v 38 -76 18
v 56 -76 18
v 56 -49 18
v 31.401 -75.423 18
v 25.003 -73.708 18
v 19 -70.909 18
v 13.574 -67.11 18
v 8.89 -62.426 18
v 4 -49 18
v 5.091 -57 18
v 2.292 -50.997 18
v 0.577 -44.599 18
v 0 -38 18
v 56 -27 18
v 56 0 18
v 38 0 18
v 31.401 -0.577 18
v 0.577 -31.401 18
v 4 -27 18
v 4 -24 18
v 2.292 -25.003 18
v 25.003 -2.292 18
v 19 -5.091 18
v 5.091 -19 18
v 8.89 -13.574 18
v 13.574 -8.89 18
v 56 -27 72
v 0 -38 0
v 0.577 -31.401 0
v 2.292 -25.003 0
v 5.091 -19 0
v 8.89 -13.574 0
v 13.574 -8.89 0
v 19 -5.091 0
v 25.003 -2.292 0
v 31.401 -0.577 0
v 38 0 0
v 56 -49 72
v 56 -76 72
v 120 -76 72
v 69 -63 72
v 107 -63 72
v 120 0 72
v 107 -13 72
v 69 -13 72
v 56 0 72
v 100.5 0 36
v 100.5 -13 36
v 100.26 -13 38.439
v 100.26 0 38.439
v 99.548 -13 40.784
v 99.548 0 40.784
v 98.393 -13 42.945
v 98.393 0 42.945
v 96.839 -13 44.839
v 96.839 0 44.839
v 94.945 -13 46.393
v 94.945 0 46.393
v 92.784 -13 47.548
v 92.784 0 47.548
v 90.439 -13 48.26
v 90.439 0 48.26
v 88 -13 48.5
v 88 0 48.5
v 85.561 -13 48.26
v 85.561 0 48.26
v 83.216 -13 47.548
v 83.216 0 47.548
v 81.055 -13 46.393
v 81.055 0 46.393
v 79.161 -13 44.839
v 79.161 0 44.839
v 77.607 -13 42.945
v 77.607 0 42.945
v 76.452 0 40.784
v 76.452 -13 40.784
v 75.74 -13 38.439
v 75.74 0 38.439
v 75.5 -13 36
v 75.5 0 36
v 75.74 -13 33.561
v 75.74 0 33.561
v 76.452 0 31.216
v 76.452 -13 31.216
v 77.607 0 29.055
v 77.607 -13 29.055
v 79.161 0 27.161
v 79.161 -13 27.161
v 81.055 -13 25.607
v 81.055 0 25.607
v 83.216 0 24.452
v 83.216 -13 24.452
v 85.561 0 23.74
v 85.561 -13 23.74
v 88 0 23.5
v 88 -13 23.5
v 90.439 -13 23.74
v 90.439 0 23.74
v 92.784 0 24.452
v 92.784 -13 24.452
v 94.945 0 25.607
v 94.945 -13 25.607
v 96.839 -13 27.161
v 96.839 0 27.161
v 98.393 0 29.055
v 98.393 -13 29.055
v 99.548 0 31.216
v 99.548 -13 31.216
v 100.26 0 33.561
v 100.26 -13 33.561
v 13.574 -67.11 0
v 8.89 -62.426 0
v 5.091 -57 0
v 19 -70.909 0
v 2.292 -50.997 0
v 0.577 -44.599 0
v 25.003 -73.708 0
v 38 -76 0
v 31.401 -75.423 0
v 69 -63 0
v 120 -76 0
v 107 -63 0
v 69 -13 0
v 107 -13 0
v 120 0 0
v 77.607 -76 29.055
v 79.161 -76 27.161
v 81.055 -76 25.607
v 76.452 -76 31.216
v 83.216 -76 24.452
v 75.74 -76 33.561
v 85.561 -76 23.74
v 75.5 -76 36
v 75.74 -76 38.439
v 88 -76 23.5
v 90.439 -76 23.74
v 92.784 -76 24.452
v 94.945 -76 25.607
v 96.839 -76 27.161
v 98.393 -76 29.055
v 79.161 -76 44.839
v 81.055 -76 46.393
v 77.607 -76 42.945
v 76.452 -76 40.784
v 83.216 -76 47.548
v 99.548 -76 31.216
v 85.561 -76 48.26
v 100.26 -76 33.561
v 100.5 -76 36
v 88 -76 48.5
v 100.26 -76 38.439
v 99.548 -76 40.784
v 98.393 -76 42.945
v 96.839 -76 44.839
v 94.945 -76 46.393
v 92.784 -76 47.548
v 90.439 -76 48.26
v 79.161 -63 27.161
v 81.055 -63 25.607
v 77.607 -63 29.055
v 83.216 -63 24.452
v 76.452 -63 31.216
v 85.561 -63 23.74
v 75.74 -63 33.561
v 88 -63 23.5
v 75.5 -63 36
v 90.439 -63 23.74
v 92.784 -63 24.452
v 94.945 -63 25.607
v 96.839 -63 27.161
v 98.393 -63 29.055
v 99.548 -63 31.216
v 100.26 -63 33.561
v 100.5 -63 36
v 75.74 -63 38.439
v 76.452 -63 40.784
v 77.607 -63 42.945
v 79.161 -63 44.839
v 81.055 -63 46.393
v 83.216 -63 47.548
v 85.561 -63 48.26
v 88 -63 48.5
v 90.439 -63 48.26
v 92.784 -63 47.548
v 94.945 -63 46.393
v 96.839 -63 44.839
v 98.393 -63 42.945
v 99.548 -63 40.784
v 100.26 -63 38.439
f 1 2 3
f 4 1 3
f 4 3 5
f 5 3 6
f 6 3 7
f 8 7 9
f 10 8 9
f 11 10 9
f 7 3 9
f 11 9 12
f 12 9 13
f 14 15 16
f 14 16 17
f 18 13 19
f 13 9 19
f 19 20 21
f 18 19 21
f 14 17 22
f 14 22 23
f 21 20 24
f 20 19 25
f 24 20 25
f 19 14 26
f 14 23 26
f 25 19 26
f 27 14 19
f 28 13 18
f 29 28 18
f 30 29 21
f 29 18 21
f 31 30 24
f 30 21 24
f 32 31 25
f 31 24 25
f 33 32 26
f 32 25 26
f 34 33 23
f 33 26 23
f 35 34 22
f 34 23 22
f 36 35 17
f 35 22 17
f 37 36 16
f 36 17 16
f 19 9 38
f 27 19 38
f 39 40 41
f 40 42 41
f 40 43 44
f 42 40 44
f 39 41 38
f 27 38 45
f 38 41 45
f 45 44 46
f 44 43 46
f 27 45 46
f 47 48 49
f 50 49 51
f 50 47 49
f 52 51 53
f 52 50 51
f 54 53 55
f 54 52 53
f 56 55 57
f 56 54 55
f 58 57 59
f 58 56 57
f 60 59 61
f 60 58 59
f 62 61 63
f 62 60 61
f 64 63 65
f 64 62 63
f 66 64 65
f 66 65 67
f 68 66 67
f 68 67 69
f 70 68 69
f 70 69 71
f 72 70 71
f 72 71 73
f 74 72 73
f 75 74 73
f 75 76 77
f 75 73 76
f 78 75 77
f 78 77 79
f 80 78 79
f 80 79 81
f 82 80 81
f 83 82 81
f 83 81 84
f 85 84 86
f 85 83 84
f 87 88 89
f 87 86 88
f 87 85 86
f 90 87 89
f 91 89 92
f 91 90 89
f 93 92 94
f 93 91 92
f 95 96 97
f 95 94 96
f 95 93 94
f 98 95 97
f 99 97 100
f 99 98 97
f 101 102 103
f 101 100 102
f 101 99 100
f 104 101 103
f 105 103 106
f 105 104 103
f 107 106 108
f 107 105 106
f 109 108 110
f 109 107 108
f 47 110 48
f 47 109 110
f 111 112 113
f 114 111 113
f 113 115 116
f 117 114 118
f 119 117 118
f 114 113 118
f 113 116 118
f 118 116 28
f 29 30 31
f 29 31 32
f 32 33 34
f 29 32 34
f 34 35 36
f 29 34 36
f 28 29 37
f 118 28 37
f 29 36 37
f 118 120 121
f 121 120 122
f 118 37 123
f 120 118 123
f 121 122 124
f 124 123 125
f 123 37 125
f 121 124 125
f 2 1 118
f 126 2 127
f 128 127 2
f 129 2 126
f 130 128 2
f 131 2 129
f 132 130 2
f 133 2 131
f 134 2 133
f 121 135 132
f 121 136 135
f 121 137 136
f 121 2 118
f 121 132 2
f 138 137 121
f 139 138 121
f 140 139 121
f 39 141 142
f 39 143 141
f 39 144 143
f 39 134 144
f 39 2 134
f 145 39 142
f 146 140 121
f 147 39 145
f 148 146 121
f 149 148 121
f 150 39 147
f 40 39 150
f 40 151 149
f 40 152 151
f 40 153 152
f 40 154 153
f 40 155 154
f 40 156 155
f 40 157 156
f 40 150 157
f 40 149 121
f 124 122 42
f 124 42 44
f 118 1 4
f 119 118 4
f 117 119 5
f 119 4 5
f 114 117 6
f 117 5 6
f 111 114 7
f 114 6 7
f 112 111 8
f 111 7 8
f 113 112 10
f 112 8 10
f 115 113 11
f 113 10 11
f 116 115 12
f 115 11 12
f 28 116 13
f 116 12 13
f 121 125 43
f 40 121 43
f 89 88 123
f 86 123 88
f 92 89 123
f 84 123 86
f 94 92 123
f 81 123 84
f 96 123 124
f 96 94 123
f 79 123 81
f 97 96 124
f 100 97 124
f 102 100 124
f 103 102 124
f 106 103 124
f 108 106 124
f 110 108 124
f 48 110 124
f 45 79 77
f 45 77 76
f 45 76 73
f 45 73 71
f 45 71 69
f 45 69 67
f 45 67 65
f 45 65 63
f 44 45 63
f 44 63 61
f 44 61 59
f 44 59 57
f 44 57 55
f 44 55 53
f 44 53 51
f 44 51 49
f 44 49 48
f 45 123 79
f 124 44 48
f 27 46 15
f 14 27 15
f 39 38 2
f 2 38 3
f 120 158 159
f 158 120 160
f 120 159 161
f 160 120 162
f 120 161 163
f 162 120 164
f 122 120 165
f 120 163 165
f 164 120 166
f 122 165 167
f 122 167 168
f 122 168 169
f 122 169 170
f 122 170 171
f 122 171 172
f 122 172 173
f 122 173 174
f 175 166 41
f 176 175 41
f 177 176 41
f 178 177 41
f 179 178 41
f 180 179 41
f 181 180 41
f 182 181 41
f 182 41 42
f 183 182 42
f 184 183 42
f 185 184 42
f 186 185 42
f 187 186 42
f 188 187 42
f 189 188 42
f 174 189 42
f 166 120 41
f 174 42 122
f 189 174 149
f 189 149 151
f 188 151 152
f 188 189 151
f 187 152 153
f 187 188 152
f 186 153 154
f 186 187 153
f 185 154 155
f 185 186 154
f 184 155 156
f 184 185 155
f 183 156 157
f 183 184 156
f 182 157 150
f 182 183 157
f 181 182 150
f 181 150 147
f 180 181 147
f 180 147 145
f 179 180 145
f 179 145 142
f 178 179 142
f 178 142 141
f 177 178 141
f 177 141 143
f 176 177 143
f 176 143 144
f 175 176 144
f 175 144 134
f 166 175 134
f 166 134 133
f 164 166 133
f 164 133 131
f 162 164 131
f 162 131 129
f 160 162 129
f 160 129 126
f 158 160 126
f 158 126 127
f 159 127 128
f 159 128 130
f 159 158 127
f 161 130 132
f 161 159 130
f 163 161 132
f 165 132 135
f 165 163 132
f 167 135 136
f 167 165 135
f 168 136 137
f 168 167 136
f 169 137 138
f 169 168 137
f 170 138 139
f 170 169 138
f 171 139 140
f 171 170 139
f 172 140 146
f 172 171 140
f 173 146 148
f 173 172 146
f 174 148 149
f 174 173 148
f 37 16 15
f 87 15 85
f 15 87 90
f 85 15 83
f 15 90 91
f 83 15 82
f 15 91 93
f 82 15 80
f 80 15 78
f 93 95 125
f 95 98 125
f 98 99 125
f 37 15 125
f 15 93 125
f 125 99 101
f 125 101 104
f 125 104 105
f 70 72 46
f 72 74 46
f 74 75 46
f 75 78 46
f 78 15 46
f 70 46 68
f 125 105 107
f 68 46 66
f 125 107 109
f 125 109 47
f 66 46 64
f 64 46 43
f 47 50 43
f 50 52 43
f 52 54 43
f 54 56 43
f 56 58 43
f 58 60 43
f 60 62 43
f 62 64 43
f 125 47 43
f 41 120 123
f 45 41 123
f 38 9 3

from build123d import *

# Parameters (mm, degrees)
F0_R     = 12.5
F1_DEPTH = 76
F2_W     = 38
F2_H     = 50
F3_DEPTH = 124
F5_DEPTH = 125.4
F7_DEPTH = 54
F9_DEPTH = 25


with BuildPart() as f1:
    # F0 (on Front) → F1 (new body)
    with BuildSketch(Plane.XZ):
        Polygon((0, 18), (0, 0), (120, 0), (120, 72), (56, 72), (56, 18), align=None)
        with Locations((88, 36)):
            Circle(F0_R, mode=Mode.SUBTRACT)
    extrude(amount=F1_DEPTH)

    # F2 (on face) → F3 (cut)
    with BuildSketch(Plane.XY.offset(72)):
        with Locations((88, -38)):
            Rectangle(F2_W, F2_H)
    extrude(amount=-F3_DEPTH, mode=Mode.SUBTRACT)

    # F4 (on face) → F5 (cut)
    with BuildSketch(Plane.XY.offset(18)):
        with BuildLine():
            ThreePointArc((0, -38), (11.129942, -11.129942), (38, 0))
            Line((38, 0), (0, 0))
            Line((0, 0), (0, -38))
        make_face()
        with BuildLine():
            ThreePointArc((38, -76), (11.129942, -64.870058), (0, -38))
            Line((0, -38), (0, -76))
            Line((0, -76), (38, -76))
        make_face()
    extrude(amount=-F5_DEPTH, mode=Mode.SUBTRACT)

    # F6 (on face) → F7 (join)
    with BuildSketch(Plane.XY.offset(18)):
        Polygon((56, -49), (56, -38), (56, -27), (4, -27), (4, -49), align=None)
    extrude(amount=F7_DEPTH)

    # F8 (on face) → F9 (cut)
    with BuildSketch(Plane.XZ.offset(49)):
        Polygon((4, 72), (4, 18), (56, 72), align=None)
    extrude(amount=-F9_DEPTH, mode=Mode.SUBTRACT)


solid = f1.part
